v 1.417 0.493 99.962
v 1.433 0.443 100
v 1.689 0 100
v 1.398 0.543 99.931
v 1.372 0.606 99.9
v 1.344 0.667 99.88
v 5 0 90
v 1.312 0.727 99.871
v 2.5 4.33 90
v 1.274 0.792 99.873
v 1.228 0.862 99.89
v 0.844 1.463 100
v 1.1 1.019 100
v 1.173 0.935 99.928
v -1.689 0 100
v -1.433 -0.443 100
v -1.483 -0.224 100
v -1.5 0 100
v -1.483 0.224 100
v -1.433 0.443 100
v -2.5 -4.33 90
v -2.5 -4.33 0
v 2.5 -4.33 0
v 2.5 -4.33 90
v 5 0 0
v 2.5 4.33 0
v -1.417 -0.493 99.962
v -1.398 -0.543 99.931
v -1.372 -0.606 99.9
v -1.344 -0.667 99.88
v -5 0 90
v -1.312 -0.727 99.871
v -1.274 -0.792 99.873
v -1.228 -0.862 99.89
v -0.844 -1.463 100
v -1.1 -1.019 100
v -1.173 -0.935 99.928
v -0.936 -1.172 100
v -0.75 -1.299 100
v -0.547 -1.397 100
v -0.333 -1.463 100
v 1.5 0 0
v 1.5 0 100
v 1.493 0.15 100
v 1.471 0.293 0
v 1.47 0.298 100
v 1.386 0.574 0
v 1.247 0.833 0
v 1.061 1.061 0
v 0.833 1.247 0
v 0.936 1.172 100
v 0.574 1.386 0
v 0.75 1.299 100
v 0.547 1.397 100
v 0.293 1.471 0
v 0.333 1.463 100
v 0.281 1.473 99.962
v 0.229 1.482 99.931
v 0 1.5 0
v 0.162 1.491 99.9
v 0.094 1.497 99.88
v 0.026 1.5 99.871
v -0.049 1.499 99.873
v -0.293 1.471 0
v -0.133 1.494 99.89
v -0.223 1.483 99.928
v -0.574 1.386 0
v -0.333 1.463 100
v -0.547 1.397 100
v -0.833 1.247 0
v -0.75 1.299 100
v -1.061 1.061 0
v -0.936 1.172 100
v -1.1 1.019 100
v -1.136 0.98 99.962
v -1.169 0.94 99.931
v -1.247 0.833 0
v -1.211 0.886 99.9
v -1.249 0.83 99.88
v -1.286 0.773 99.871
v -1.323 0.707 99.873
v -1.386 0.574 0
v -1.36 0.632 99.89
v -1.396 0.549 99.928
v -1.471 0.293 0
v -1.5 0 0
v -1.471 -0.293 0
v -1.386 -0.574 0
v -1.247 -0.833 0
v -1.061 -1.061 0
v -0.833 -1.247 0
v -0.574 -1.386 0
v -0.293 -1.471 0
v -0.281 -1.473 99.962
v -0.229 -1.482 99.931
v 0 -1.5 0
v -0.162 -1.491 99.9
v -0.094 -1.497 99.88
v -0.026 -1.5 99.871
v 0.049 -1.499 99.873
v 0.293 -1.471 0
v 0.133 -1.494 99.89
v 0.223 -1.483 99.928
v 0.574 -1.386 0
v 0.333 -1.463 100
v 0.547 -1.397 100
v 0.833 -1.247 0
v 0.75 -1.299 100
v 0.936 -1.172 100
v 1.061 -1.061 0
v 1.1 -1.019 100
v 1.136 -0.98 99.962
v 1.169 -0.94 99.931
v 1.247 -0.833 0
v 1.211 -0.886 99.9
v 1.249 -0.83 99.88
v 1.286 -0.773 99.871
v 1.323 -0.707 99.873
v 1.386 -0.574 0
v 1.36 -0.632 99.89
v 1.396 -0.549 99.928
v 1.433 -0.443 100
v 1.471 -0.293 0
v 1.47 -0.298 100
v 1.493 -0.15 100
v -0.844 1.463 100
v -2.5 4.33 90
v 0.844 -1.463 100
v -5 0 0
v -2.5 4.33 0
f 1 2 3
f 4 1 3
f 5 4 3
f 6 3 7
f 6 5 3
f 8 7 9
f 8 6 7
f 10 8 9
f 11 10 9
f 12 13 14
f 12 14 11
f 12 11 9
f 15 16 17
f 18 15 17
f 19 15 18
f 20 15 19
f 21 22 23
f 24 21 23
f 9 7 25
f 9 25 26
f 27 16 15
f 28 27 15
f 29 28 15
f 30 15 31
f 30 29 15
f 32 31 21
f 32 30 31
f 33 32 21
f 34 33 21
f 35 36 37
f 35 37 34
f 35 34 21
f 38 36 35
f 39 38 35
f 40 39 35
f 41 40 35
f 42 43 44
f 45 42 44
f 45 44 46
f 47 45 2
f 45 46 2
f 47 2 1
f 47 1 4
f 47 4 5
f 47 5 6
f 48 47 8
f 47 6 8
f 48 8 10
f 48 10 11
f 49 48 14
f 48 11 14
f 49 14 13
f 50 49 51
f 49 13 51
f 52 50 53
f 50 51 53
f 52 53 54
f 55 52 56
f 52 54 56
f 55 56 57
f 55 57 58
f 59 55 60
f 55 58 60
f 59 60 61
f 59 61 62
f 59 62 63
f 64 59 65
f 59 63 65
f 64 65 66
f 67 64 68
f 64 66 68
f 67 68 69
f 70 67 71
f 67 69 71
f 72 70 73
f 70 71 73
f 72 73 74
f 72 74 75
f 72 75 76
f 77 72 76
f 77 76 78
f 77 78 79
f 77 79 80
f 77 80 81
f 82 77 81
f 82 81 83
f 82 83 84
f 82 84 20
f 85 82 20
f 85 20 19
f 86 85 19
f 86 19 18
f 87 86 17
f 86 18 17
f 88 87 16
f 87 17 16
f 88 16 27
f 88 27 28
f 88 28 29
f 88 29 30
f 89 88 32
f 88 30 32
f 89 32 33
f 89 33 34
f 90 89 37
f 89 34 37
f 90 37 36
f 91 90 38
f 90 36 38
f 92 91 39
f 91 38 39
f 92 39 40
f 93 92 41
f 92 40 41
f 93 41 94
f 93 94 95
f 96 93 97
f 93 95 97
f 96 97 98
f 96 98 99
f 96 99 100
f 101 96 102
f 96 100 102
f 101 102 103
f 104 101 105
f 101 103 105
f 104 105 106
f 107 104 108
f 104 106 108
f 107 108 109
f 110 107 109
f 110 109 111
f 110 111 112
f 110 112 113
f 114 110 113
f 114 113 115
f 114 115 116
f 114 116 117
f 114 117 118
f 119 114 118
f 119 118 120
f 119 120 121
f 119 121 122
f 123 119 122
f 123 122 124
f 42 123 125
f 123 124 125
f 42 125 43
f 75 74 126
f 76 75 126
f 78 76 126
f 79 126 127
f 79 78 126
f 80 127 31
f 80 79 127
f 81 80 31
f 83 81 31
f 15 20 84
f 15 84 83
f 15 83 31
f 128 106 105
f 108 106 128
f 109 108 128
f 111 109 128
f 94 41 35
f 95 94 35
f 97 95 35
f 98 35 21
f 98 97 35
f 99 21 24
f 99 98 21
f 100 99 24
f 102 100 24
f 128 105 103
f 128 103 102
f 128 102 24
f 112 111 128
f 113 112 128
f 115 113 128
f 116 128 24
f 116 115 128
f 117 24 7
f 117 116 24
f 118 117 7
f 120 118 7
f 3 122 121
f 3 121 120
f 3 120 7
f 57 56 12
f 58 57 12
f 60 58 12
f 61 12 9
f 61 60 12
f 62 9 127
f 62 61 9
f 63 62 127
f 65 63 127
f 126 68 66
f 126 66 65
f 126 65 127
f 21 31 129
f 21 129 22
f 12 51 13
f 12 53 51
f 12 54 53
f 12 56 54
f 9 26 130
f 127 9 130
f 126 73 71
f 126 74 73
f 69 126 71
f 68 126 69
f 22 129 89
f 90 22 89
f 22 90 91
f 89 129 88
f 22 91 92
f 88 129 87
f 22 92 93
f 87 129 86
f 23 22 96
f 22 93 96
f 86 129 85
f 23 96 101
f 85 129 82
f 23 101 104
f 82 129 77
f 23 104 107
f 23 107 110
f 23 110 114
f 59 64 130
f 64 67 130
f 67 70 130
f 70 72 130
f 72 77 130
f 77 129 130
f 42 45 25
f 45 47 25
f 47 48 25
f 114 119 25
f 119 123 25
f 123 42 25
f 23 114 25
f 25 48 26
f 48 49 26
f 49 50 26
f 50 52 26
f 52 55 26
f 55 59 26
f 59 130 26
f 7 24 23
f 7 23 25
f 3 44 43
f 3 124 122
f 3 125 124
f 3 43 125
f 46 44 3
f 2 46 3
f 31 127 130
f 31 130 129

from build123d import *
from OCP.BRepFilletAPI import BRepFilletAPI_MakeChamfer

# Parameters (mm, degrees)
VYSUNOUT1_DEPTH          = 100
ZKOSIT2_SIZE             = 10
ZKOSIT2_SIZE2            = 2.867453858
SKICA2_R                 = 1.5
ODEBRAT_VYSUNUT_M1_DEPTH = 101.218511264


with BuildPart() as part:
    # Skica1 → Vysunout1 (new body)
    with BuildSketch(Plane.XY):
        Polygon((2.5, -4.330127019), (5, 0), (2.5, 4.330127019), (-2.5, 4.330127019), (-5, 0), (-2.5, -4.330127019), align=None)
    extrude(amount=VYSUNOUT1_DEPTH)

    # Zkosit2: one chamfer whose edges measure the first distance from different faces: ONE call of the kernel's chamfer builder (chamfer() names one face for all edges)
    zkosit2_edges_1 = [part.edges().sort_by_distance(p)[0] for p in [
        (3.75, 2.165063509, 100),
    ]]
    zkosit2_side_1 = [part.faces().sort_by_distance(p)[0] for p in [
        (3.75, 2.165063509, 50),
    ]]
    zkosit2_edges_2 = [part.edges().sort_by_distance(p)[0] for p in [
        (0, 4.330127019, 100),
    ]]
    zkosit2_side_2 = [part.faces().sort_by_distance(p)[0] for p in [
        (0, 4.330127019, 50),
    ]]
    zkosit2_edges_3 = [part.edges().sort_by_distance(p)[0] for p in [
        (-3.75, 2.165063509, 100),
    ]]
    zkosit2_side_3 = [part.faces().sort_by_distance(p)[0] for p in [
        (-3.75, 2.165063509, 50),
    ]]
    zkosit2_edges_4 = [part.edges().sort_by_distance(p)[0] for p in [
        (-3.75, -2.165063509, 100),
    ]]
    zkosit2_side_4 = [part.faces().sort_by_distance(p)[0] for p in [
        (-3.75, -2.165063509, 50),
    ]]
    zkosit2_edges_5 = [part.edges().sort_by_distance(p)[0] for p in [
        (0, -4.330127019, 100),
    ]]
    zkosit2_side_5 = [part.faces().sort_by_distance(p)[0] for p in [
        (0, -4.330127019, 50),
    ]]
    zkosit2_edges_6 = [part.edges().sort_by_distance(p)[0] for p in [
        (3.75, -2.165063509, 100),
    ]]
    zkosit2_side_6 = [part.faces().sort_by_distance(p)[0] for p in [
        (3.75, -2.165063509, 50),
    ]]
    zkosit2 = BRepFilletAPI_MakeChamfer(part.part.solid().wrapped)
    for e in zkosit2_edges_1:
        zkosit2.Add(ZKOSIT2_SIZE, ZKOSIT2_SIZE2, e.wrapped, zkosit2_side_1[0].wrapped)  # the first distance lies on this face
    for e in zkosit2_edges_2:
        zkosit2.Add(ZKOSIT2_SIZE, ZKOSIT2_SIZE2, e.wrapped, zkosit2_side_2[0].wrapped)  # the first distance lies on this face
    for e in zkosit2_edges_3:
        zkosit2.Add(ZKOSIT2_SIZE, ZKOSIT2_SIZE2, e.wrapped, zkosit2_side_3[0].wrapped)  # the first distance lies on this face
    for e in zkosit2_edges_4:
        zkosit2.Add(ZKOSIT2_SIZE, ZKOSIT2_SIZE2, e.wrapped, zkosit2_side_4[0].wrapped)  # the first distance lies on this face
    for e in zkosit2_edges_5:
        zkosit2.Add(ZKOSIT2_SIZE, ZKOSIT2_SIZE2, e.wrapped, zkosit2_side_5[0].wrapped)  # the first distance lies on this face
    for e in zkosit2_edges_6:
        zkosit2.Add(ZKOSIT2_SIZE, ZKOSIT2_SIZE2, e.wrapped, zkosit2_side_6[0].wrapped)  # the first distance lies on this face
    add(Compound.cast(zkosit2.Shape()), mode=Mode.REPLACE)

    # Skica2 → Odebrat vysunutím1 (cut, through all)
    with BuildSketch(Plane.XY.offset(100)):
        Circle(SKICA2_R)
    extrude(amount=-ODEBRAT_VYSUNUT_M1_DEPTH, mode=Mode.SUBTRACT)


solid = part.part
